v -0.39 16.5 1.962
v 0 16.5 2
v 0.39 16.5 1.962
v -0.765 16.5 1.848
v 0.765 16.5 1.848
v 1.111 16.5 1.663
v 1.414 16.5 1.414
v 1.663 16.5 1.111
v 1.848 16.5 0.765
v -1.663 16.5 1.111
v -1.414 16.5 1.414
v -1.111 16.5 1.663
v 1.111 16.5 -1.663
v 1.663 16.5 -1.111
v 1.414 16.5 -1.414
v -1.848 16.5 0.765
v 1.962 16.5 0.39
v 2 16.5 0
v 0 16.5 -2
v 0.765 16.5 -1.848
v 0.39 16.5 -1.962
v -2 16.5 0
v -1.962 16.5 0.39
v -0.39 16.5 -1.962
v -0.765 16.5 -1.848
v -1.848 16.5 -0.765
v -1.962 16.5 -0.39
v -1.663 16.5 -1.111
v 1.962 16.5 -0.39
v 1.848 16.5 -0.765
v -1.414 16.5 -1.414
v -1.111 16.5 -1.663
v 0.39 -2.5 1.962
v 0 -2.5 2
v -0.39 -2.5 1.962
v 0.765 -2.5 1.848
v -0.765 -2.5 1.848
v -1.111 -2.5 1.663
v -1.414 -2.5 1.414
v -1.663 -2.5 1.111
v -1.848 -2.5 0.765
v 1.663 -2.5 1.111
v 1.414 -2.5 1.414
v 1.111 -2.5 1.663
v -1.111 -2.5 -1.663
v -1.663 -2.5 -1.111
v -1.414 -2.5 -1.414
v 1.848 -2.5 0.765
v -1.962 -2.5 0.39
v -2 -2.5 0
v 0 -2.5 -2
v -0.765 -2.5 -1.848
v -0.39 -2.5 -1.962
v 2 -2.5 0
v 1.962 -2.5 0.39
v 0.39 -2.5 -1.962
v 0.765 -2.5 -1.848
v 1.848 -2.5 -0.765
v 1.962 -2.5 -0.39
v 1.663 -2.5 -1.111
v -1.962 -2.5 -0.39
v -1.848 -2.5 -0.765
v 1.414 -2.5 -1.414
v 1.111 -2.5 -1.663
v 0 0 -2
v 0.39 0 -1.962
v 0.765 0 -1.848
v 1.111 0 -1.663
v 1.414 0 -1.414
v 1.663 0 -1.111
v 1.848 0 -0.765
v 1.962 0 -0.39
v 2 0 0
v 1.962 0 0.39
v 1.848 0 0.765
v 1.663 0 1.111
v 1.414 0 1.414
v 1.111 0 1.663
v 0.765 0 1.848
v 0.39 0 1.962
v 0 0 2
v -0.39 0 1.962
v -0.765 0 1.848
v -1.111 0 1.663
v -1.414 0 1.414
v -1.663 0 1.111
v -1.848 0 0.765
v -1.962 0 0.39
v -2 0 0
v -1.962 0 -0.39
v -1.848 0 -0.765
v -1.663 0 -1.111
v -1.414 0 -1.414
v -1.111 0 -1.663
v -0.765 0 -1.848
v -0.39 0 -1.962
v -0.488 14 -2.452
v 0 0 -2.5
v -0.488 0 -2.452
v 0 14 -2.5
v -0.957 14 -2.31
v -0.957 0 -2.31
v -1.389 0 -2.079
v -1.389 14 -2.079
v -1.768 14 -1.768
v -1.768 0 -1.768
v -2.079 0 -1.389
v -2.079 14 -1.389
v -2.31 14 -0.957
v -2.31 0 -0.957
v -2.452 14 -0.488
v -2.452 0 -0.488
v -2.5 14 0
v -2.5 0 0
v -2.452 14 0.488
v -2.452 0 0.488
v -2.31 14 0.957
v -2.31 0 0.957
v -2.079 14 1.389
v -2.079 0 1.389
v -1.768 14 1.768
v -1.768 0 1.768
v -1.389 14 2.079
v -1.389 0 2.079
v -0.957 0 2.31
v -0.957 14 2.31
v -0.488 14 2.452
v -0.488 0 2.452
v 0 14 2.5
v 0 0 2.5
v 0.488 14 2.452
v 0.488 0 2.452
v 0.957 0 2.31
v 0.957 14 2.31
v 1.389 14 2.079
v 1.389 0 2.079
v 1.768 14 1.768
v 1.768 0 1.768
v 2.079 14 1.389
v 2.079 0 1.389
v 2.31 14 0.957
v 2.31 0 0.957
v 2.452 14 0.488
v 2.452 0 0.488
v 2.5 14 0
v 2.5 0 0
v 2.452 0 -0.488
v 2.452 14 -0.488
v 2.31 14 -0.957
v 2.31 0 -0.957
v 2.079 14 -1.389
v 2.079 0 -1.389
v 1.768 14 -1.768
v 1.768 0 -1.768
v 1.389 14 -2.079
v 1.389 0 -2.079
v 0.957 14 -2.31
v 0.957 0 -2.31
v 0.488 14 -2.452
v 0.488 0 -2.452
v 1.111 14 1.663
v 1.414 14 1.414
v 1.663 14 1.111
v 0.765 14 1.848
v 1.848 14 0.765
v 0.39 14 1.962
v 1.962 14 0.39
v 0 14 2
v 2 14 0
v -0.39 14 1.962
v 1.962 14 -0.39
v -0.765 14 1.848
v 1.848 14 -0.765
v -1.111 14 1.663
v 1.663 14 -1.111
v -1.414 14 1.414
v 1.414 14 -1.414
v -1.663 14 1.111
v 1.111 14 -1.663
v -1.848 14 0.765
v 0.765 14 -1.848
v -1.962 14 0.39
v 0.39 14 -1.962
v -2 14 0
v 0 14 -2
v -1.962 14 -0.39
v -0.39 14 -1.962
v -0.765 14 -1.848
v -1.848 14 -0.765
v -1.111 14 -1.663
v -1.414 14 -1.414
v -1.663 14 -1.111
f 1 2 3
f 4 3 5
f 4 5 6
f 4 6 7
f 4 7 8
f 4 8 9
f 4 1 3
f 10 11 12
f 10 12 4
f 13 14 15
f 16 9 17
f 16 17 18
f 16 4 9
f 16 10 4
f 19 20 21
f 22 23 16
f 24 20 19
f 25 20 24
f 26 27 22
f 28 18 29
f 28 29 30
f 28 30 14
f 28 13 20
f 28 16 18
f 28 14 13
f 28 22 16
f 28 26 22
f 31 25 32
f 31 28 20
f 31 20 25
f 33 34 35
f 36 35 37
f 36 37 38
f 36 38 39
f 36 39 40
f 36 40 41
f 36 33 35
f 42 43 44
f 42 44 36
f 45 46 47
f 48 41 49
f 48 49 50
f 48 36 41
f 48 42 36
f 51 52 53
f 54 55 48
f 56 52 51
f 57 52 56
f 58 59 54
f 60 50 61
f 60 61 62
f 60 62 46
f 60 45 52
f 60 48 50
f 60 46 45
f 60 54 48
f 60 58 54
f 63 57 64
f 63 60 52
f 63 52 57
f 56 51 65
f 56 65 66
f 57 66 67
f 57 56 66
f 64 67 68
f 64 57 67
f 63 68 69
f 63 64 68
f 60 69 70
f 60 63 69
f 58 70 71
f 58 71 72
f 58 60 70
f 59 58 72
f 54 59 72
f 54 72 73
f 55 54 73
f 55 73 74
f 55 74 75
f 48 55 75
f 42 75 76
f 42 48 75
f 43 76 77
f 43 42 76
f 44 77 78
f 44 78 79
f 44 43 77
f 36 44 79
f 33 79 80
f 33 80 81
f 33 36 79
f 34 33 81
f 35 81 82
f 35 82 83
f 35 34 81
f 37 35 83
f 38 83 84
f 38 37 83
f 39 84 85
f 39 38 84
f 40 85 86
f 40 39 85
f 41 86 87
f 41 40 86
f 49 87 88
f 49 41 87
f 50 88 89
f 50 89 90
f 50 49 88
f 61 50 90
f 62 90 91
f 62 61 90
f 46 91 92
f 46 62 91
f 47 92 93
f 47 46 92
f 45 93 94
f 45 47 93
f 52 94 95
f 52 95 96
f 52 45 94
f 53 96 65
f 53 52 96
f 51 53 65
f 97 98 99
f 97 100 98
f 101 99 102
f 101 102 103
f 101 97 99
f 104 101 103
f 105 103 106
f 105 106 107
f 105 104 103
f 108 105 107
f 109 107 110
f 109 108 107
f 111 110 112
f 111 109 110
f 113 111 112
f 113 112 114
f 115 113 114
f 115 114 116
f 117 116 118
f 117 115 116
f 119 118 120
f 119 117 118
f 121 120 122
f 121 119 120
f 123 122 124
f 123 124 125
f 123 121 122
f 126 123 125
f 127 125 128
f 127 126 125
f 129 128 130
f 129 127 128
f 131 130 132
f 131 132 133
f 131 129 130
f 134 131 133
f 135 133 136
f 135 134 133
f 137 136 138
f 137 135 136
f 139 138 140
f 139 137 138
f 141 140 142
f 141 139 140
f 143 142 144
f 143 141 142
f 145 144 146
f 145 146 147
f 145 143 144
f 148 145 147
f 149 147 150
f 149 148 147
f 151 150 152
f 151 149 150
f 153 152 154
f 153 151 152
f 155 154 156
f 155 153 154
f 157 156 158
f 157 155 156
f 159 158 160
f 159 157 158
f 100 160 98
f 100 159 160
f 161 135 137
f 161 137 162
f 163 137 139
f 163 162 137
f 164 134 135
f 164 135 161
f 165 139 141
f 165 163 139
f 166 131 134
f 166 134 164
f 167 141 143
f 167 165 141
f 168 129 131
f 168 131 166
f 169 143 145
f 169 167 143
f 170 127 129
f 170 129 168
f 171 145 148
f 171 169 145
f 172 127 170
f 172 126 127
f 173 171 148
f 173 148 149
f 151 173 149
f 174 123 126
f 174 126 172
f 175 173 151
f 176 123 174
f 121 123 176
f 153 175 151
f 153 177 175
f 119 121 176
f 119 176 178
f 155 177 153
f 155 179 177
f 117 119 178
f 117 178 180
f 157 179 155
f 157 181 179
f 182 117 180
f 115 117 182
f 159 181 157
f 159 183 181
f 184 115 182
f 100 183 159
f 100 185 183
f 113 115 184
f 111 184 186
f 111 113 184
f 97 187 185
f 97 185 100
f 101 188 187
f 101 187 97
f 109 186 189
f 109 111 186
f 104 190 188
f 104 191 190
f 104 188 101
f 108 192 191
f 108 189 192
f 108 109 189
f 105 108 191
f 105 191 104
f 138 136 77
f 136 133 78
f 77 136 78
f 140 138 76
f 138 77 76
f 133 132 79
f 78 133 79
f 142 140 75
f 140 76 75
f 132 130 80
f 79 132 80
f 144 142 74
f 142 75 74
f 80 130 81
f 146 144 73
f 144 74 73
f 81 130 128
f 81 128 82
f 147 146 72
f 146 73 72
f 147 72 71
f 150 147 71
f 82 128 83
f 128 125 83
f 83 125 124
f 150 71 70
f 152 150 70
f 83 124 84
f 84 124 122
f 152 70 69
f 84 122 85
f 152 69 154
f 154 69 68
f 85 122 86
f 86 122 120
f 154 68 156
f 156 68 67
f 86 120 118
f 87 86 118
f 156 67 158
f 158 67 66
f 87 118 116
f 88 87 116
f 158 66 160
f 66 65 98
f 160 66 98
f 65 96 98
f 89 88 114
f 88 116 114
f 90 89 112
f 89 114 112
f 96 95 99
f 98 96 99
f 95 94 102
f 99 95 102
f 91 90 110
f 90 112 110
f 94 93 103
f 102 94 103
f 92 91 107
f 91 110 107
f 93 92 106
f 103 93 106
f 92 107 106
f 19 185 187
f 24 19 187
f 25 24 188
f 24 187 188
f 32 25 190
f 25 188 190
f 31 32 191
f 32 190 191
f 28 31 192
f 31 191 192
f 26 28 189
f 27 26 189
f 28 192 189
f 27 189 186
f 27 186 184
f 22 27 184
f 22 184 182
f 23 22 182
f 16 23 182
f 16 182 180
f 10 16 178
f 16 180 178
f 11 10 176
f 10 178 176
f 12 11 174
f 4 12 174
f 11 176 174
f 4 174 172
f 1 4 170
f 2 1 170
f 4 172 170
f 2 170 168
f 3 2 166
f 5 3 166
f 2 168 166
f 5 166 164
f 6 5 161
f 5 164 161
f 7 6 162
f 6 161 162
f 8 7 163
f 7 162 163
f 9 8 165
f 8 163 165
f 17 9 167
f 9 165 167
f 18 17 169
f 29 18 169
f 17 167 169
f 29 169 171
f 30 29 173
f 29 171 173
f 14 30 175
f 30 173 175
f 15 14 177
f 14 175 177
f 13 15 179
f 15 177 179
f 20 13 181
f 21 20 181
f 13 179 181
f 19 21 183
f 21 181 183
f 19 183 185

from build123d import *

# Parameters (mm, degrees)
SKETCH1_W           = 2.5
SKETCH1_H           = 14
SKETCH2_R           = 2
BOSS_EXTRUDE1_DEPTH = 2.5
BOSS_EXTRUDE2_START = 2.5
SKETCH3_R           = 2
BOSS_EXTRUDE2_DEPTH = 2.5


with BuildPart() as part:
    # Sketch1 → Revolve-Thin1 (revolve)
    with BuildSketch(Plane.XY, mode=Mode.PRIVATE) as revolve_thin1_sk:
        with Locations((-1.25, 7)):
            Rectangle(SKETCH1_W, SKETCH1_H)
    revolve(revolve_thin1_sk.sketch.rotate(Axis((0, 0, 0), (0, 1, 0)), 270), axis=Axis((0, 0, 0), (0, 1, 0)))

    # Sketch2 → Boss-Extrude1 (add)
    with BuildSketch(Plane(origin=(0, 14, 0), x_dir=(1, 0, 0), z_dir=(0, 1, 0))):
        with Locations(Location((0, 0, 0), (0, 0, 90))):
            Circle(SKETCH2_R)
    extrude(amount=BOSS_EXTRUDE1_DEPTH)

    # Sketch3 → Boss-Extrude2 (add)
    with BuildSketch(Plane(origin=(0, 0, 0), x_dir=(-1, 0, 0), z_dir=(0, -1, 0)).offset(BOSS_EXTRUDE2_START)):
        with Locations(Location((0, 0, 0), (0, 0, 90))):
            Circle(SKETCH3_R)
    extrude(amount=-BOSS_EXTRUDE2_DEPTH)


solid = part.part
